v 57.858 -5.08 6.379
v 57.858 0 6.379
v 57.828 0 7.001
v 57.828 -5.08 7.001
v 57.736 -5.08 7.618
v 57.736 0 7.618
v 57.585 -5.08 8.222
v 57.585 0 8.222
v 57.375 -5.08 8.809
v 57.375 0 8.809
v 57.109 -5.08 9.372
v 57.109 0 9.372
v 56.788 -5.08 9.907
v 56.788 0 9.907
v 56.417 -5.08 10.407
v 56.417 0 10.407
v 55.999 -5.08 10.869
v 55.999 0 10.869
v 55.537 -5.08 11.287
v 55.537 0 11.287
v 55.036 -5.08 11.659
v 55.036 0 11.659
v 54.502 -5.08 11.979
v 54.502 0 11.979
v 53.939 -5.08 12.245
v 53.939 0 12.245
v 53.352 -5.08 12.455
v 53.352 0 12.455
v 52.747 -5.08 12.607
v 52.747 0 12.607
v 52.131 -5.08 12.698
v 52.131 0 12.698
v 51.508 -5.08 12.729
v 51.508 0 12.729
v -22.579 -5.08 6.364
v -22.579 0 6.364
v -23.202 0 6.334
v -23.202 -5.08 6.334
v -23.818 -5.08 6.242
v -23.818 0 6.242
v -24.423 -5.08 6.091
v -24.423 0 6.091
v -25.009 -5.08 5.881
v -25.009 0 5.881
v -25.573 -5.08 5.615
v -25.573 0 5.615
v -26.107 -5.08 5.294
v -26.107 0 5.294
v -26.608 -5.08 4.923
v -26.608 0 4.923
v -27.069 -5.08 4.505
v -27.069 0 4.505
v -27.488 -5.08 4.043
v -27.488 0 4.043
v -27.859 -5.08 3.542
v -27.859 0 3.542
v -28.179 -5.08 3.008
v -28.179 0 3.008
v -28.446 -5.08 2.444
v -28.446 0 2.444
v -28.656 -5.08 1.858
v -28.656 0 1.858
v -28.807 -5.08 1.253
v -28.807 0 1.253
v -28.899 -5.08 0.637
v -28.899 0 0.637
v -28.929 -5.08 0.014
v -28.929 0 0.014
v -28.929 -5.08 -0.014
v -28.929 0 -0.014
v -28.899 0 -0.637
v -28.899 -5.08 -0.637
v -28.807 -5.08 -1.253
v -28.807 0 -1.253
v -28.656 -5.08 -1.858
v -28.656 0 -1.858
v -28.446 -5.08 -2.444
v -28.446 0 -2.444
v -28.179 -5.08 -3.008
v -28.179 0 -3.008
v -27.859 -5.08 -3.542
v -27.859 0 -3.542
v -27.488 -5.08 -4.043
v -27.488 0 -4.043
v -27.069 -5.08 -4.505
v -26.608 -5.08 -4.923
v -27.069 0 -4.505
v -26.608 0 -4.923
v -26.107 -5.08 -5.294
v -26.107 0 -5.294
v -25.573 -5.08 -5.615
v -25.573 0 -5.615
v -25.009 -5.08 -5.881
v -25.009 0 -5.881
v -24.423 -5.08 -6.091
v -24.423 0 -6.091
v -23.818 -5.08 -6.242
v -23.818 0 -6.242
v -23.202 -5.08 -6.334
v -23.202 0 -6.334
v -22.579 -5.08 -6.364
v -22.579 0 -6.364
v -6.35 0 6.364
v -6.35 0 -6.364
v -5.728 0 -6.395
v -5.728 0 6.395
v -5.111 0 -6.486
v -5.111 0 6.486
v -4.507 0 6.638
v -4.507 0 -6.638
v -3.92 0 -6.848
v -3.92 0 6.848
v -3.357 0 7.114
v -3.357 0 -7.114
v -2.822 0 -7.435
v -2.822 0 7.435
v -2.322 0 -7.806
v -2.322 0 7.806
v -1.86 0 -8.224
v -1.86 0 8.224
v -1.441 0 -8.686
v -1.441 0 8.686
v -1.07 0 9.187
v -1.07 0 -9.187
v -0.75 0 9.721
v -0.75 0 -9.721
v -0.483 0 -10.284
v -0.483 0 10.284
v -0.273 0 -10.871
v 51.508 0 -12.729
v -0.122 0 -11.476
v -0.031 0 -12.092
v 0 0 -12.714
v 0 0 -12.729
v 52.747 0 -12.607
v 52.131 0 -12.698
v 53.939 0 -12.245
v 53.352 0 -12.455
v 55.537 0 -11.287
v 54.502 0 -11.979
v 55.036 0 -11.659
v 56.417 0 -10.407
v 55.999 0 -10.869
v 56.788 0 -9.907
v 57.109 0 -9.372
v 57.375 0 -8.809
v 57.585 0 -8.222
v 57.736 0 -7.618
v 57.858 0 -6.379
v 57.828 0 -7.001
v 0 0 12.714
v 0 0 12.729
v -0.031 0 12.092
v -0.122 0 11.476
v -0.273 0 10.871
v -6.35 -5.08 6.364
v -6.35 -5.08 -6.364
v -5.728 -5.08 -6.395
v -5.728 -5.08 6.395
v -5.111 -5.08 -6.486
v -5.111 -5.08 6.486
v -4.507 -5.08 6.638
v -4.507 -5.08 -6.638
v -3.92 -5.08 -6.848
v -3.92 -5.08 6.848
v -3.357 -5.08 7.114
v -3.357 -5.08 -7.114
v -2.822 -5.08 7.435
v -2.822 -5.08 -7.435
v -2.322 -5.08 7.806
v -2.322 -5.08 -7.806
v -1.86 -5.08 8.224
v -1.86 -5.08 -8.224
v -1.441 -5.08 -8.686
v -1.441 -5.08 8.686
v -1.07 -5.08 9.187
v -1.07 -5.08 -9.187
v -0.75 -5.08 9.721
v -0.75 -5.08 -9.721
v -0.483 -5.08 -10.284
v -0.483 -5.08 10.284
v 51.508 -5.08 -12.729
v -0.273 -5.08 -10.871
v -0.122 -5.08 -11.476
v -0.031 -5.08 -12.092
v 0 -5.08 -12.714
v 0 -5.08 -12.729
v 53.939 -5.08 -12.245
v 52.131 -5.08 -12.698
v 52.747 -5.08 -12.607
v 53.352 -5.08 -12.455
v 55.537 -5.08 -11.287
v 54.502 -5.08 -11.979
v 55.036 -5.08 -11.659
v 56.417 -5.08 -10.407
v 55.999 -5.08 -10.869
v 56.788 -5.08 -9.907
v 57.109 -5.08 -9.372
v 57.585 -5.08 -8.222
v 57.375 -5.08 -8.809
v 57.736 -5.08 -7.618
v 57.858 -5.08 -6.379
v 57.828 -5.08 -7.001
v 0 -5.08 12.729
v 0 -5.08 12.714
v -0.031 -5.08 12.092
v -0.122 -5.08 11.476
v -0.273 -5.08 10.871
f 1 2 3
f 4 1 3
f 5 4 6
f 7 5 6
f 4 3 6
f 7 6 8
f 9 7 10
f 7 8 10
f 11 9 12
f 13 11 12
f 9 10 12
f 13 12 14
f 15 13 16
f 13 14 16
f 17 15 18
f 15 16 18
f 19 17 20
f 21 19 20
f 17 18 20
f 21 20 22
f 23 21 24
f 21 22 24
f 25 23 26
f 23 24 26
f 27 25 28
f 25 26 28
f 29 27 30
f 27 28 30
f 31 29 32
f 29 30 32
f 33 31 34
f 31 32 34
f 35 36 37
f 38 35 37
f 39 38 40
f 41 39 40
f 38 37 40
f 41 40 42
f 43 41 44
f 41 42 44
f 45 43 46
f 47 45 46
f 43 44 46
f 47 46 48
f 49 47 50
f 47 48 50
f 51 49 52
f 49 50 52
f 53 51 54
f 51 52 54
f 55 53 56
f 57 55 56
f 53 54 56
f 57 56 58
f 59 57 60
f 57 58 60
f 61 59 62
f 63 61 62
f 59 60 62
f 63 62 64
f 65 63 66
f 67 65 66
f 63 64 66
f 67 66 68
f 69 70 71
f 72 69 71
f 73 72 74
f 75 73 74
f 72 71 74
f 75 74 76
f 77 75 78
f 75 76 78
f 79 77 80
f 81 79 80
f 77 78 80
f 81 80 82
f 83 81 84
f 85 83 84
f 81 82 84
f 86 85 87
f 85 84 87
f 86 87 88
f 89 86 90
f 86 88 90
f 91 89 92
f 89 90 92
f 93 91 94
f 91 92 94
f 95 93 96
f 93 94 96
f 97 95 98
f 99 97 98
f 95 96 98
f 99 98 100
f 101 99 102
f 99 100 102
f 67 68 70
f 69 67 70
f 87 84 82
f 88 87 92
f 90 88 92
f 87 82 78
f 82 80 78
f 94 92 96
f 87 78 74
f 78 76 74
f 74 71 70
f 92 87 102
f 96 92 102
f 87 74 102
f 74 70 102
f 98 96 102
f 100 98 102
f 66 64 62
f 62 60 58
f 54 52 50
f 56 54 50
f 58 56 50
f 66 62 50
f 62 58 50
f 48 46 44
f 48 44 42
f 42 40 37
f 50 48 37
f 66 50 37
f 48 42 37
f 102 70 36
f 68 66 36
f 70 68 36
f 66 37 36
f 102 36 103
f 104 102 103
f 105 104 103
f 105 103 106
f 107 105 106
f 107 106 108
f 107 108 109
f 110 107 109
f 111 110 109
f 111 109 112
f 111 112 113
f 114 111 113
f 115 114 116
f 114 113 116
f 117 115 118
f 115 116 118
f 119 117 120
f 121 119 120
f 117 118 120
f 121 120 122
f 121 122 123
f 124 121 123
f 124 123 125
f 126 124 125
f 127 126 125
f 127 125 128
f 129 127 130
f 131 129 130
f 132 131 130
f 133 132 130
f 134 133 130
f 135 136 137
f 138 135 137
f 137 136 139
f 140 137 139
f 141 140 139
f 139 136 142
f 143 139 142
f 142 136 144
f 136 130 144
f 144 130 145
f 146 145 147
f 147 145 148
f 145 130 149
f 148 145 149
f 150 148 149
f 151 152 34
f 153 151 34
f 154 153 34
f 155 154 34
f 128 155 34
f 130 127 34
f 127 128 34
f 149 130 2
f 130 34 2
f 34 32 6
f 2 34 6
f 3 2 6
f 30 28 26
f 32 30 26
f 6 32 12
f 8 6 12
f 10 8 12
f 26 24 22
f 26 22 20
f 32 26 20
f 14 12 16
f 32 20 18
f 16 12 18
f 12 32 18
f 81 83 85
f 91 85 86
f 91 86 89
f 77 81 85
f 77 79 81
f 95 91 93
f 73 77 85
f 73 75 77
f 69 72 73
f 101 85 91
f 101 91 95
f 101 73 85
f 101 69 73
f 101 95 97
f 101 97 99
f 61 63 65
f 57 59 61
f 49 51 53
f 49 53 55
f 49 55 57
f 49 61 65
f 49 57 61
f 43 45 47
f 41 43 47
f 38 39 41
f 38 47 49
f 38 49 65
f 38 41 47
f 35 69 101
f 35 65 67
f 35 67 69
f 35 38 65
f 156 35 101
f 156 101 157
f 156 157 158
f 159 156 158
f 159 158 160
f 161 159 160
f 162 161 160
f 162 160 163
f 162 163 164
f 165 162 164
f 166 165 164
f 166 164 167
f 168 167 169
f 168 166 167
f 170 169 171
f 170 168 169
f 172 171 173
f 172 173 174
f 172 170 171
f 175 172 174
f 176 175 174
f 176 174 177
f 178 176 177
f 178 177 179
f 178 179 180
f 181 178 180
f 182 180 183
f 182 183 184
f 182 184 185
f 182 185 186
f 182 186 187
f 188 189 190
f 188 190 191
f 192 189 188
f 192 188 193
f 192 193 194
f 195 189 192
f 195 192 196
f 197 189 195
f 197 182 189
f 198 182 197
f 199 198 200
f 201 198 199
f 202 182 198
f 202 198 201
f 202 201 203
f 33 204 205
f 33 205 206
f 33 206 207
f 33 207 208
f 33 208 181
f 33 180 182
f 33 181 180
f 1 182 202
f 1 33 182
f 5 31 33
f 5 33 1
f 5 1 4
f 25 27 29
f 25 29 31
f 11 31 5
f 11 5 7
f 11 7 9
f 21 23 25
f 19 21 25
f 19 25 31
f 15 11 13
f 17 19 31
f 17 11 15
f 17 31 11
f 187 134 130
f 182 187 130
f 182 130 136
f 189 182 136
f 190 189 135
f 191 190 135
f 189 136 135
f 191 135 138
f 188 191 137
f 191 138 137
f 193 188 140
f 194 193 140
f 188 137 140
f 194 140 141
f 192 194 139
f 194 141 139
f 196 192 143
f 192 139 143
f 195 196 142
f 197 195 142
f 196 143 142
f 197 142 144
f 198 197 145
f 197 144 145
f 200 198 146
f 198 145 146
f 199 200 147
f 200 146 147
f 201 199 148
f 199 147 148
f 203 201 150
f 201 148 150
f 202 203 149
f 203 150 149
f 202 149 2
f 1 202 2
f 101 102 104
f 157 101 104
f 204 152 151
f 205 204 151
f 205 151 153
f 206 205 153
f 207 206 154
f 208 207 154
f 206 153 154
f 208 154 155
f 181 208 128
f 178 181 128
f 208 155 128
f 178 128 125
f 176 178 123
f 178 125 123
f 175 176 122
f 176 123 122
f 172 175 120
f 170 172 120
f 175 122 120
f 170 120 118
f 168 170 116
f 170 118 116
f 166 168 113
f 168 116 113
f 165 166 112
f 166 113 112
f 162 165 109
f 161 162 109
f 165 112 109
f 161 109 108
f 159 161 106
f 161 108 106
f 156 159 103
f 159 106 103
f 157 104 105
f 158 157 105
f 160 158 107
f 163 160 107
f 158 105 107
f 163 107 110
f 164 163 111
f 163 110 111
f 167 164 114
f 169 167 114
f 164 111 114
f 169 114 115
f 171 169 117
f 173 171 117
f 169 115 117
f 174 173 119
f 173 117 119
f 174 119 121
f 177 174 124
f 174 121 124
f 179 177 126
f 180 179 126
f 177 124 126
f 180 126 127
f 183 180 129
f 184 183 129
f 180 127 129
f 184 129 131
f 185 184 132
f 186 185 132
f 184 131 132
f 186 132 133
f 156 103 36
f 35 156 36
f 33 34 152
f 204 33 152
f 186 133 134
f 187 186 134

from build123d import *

# Parameters (mm, degrees)
F1_DEPTH = 5.08


with BuildPart() as f1:
    # F0 (on Front) → F1 (new body)
    with BuildSketch(Plane.XZ):
        with BuildLine():
            Line((0, 12.728863), (0, 12.714432))
            ThreePointArc((0, 12.714432), (-1.859872, 8.224304), (-6.35, 6.364432))
            Line((-6.35, 6.364432), (-22.579235, 6.364432))
            ThreePointArc((-22.579235, 6.364432), (-27.069363, 4.50456), (-28.929235, 0.014432))
            Line((-28.929235, 0.014432), (-28.929235, 0))
            Line((-28.929235, 0), (0, 0))
            Line((0, 0), (57.858475, 0))
            Line((57.858475, 0), (57.858475, 6.378863))
            ThreePointArc((57.858475, 6.378863), (55.998604, 10.868991), (51.508475, 12.728863))
            Line((51.508475, 12.728863), (45.129612, 12.728863))
            Line((45.129612, 12.728863), (0, 12.728863))
        make_face()
        with BuildLine():
            Line((0, 0), (-28.929235, 0))
            Line((-28.929235, 0), (-28.929235, -0.014432))
            ThreePointArc((-28.929235, -0.014432), (-27.069363, -4.50456), (-22.579235, -6.364432))
            Line((-22.579235, -6.364432), (-6.35, -6.364432))
            ThreePointArc((-6.35, -6.364432), (-1.859872, -8.224304), (0, -12.714432))
            Line((0, -12.714432), (0, -12.728863))
            Line((0, -12.728863), (45.129612, -12.728863))
            Line((45.129612, -12.728863), (51.508475, -12.728863))
            ThreePointArc((51.508475, -12.728863), (55.998604, -10.868991), (57.858475, -6.378863))
            Line((57.858475, -6.378863), (57.858475, 0))
            Line((57.858475, 0), (0, 0))
        make_face()
    extrude(amount=F1_DEPTH)


solid = f1.part
